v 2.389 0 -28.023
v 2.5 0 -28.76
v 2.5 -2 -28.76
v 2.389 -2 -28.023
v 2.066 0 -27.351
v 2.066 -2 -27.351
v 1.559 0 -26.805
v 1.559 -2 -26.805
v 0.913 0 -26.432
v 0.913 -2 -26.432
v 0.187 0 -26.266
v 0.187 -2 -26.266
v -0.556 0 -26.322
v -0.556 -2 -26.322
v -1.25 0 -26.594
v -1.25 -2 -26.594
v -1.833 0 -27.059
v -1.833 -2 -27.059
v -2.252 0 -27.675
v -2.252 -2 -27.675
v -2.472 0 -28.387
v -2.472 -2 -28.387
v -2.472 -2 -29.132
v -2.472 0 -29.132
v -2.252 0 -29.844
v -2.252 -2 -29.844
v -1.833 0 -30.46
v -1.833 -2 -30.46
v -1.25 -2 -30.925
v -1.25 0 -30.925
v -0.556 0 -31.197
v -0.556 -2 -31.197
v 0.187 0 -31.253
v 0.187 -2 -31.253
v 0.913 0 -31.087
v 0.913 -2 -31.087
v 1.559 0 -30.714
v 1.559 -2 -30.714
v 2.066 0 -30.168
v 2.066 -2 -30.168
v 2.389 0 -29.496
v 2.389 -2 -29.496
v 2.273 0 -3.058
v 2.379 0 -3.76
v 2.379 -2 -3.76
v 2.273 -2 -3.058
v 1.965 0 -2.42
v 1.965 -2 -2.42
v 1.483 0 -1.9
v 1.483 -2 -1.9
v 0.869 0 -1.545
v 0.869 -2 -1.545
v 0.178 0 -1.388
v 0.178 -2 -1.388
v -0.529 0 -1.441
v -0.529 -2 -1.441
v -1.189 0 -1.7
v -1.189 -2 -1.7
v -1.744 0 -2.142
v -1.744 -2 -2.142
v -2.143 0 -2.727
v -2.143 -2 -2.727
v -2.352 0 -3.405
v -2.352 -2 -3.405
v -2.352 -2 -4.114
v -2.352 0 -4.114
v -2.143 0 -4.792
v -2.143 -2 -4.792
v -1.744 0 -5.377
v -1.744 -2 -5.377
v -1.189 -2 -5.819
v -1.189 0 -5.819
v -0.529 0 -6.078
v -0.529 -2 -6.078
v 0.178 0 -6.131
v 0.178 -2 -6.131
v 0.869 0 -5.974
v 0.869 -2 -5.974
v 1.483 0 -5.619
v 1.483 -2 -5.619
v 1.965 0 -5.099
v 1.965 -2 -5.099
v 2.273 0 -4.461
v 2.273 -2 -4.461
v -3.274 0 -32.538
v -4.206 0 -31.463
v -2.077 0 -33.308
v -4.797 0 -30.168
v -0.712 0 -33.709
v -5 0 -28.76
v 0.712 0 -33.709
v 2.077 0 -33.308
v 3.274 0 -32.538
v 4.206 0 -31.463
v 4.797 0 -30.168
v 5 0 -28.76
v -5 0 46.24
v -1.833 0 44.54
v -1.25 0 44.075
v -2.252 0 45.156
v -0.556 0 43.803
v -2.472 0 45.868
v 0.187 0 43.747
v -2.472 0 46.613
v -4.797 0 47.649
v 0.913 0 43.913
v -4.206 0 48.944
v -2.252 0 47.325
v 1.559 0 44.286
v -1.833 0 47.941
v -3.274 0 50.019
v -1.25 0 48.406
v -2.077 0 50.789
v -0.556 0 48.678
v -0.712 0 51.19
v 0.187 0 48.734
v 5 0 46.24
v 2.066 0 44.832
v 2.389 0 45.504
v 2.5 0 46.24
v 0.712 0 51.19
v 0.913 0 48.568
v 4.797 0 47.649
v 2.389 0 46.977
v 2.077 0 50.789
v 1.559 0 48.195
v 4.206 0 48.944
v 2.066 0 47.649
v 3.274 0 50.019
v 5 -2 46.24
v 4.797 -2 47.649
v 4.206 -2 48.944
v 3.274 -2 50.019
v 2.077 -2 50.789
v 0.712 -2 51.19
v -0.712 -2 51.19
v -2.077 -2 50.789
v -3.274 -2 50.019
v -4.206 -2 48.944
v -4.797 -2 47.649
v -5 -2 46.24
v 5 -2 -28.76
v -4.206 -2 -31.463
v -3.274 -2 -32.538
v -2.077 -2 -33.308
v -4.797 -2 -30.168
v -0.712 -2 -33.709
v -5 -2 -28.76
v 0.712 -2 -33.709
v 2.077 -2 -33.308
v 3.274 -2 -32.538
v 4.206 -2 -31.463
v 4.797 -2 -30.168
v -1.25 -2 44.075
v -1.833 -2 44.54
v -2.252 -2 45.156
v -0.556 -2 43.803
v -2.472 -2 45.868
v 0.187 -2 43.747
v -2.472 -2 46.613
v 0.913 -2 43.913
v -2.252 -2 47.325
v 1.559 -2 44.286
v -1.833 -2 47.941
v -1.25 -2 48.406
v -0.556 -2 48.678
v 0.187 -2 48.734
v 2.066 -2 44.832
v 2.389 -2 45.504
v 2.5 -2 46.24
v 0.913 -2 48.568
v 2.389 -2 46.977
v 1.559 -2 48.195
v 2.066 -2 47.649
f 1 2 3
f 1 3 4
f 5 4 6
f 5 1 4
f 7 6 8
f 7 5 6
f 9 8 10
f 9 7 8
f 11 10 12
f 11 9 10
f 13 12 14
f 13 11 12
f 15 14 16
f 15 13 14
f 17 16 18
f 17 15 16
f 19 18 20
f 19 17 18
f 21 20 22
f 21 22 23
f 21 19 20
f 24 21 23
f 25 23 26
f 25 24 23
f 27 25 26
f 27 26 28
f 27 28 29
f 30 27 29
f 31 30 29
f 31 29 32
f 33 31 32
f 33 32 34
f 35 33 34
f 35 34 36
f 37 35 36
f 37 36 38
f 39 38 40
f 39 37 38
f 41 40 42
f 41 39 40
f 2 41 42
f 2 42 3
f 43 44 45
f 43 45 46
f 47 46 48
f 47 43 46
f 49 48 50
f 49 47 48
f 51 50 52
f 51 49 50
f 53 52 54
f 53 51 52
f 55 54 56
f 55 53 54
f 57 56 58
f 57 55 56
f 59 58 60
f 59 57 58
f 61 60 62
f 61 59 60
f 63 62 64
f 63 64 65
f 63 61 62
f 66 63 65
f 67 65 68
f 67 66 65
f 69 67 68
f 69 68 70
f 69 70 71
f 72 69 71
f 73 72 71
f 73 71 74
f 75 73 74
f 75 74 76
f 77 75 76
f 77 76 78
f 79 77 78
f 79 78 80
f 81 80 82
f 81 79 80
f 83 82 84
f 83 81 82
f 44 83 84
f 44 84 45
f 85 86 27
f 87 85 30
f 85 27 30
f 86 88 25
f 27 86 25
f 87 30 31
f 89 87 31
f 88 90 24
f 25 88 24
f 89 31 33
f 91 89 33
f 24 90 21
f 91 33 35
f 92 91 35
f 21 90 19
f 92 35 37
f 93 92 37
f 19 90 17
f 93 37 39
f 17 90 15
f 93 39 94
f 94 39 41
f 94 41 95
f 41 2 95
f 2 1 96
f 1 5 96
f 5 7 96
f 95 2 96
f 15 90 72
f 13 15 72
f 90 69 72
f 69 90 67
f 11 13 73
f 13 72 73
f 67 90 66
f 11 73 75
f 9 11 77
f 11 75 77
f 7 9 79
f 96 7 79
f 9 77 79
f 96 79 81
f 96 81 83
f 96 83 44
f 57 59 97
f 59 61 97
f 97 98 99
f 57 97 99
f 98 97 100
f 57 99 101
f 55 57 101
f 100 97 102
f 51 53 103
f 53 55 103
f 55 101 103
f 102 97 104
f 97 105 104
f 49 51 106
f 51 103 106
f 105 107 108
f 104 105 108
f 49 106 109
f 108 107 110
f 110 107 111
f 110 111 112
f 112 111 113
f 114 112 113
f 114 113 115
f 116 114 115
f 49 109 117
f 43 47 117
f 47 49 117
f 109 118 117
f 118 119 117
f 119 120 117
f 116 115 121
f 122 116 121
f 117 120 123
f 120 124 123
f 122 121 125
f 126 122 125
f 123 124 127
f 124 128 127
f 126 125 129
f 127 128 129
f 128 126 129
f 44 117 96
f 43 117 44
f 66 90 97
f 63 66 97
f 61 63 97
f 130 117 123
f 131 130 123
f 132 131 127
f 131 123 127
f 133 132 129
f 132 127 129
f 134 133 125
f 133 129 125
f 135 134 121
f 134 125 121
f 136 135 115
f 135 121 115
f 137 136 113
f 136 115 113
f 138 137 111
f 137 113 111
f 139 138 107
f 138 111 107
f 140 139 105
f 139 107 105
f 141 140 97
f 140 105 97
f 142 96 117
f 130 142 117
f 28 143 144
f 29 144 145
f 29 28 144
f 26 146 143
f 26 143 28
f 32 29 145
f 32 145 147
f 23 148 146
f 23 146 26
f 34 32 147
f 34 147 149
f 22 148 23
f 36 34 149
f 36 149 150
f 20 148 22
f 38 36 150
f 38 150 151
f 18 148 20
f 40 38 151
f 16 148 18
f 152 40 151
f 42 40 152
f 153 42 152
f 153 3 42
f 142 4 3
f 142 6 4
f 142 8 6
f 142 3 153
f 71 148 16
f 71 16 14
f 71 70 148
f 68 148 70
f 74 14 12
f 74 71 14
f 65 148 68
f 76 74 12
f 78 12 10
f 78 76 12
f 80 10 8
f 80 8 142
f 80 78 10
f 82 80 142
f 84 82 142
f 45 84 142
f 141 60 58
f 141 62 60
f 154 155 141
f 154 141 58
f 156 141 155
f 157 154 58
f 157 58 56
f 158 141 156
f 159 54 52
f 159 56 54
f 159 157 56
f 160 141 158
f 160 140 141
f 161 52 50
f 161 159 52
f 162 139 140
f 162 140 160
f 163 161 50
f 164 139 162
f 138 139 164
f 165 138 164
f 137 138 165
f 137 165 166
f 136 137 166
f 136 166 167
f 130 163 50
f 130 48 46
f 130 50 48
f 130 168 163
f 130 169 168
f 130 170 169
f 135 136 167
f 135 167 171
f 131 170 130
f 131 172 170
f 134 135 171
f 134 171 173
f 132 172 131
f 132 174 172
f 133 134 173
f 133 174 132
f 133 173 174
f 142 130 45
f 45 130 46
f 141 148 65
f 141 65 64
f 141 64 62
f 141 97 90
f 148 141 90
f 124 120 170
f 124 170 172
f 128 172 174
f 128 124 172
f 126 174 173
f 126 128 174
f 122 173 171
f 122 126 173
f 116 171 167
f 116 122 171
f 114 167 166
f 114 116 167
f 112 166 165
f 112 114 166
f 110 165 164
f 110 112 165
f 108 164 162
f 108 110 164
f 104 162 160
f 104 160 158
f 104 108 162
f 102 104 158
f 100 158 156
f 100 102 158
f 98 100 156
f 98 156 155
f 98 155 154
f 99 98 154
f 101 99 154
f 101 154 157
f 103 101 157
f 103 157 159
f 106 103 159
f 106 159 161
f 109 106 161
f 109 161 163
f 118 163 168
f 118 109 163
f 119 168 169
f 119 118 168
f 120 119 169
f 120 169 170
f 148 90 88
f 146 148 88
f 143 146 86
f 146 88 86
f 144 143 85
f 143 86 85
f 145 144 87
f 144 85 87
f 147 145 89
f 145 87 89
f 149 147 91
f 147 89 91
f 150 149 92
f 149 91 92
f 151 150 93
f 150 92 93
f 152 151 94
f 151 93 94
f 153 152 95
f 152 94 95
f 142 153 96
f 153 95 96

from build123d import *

# Parameters (mm, degrees)
F0_R     = 2.5
F0_R_2   = 2.378566
F1_DEPTH = 2


with BuildPart() as f1:
    # F0 (on Front) → F1 (new body)
    with BuildSketch(Plane.XZ):
        with BuildLine():
            Line((5, -28.759506), (5, 46.240494))
            ThreePointArc((5, 46.240494), (0, 51.240494), (-5, 46.240494))
            Line((-5, 46.240494), (-5, -28.759506))
            ThreePointArc((-5, -28.759506), (0, -33.759506), (5, -28.759506))
        make_face()
        with Locations((0, -28.759506)):
            Circle(F0_R, mode=Mode.SUBTRACT)
        with Locations((0, -3.759506)):
            Circle(F0_R_2, mode=Mode.SUBTRACT)
        with Locations((0, 46.240494)):
            Circle(F0_R, mode=Mode.SUBTRACT)
    extrude(amount=F1_DEPTH)


solid = f1.part
